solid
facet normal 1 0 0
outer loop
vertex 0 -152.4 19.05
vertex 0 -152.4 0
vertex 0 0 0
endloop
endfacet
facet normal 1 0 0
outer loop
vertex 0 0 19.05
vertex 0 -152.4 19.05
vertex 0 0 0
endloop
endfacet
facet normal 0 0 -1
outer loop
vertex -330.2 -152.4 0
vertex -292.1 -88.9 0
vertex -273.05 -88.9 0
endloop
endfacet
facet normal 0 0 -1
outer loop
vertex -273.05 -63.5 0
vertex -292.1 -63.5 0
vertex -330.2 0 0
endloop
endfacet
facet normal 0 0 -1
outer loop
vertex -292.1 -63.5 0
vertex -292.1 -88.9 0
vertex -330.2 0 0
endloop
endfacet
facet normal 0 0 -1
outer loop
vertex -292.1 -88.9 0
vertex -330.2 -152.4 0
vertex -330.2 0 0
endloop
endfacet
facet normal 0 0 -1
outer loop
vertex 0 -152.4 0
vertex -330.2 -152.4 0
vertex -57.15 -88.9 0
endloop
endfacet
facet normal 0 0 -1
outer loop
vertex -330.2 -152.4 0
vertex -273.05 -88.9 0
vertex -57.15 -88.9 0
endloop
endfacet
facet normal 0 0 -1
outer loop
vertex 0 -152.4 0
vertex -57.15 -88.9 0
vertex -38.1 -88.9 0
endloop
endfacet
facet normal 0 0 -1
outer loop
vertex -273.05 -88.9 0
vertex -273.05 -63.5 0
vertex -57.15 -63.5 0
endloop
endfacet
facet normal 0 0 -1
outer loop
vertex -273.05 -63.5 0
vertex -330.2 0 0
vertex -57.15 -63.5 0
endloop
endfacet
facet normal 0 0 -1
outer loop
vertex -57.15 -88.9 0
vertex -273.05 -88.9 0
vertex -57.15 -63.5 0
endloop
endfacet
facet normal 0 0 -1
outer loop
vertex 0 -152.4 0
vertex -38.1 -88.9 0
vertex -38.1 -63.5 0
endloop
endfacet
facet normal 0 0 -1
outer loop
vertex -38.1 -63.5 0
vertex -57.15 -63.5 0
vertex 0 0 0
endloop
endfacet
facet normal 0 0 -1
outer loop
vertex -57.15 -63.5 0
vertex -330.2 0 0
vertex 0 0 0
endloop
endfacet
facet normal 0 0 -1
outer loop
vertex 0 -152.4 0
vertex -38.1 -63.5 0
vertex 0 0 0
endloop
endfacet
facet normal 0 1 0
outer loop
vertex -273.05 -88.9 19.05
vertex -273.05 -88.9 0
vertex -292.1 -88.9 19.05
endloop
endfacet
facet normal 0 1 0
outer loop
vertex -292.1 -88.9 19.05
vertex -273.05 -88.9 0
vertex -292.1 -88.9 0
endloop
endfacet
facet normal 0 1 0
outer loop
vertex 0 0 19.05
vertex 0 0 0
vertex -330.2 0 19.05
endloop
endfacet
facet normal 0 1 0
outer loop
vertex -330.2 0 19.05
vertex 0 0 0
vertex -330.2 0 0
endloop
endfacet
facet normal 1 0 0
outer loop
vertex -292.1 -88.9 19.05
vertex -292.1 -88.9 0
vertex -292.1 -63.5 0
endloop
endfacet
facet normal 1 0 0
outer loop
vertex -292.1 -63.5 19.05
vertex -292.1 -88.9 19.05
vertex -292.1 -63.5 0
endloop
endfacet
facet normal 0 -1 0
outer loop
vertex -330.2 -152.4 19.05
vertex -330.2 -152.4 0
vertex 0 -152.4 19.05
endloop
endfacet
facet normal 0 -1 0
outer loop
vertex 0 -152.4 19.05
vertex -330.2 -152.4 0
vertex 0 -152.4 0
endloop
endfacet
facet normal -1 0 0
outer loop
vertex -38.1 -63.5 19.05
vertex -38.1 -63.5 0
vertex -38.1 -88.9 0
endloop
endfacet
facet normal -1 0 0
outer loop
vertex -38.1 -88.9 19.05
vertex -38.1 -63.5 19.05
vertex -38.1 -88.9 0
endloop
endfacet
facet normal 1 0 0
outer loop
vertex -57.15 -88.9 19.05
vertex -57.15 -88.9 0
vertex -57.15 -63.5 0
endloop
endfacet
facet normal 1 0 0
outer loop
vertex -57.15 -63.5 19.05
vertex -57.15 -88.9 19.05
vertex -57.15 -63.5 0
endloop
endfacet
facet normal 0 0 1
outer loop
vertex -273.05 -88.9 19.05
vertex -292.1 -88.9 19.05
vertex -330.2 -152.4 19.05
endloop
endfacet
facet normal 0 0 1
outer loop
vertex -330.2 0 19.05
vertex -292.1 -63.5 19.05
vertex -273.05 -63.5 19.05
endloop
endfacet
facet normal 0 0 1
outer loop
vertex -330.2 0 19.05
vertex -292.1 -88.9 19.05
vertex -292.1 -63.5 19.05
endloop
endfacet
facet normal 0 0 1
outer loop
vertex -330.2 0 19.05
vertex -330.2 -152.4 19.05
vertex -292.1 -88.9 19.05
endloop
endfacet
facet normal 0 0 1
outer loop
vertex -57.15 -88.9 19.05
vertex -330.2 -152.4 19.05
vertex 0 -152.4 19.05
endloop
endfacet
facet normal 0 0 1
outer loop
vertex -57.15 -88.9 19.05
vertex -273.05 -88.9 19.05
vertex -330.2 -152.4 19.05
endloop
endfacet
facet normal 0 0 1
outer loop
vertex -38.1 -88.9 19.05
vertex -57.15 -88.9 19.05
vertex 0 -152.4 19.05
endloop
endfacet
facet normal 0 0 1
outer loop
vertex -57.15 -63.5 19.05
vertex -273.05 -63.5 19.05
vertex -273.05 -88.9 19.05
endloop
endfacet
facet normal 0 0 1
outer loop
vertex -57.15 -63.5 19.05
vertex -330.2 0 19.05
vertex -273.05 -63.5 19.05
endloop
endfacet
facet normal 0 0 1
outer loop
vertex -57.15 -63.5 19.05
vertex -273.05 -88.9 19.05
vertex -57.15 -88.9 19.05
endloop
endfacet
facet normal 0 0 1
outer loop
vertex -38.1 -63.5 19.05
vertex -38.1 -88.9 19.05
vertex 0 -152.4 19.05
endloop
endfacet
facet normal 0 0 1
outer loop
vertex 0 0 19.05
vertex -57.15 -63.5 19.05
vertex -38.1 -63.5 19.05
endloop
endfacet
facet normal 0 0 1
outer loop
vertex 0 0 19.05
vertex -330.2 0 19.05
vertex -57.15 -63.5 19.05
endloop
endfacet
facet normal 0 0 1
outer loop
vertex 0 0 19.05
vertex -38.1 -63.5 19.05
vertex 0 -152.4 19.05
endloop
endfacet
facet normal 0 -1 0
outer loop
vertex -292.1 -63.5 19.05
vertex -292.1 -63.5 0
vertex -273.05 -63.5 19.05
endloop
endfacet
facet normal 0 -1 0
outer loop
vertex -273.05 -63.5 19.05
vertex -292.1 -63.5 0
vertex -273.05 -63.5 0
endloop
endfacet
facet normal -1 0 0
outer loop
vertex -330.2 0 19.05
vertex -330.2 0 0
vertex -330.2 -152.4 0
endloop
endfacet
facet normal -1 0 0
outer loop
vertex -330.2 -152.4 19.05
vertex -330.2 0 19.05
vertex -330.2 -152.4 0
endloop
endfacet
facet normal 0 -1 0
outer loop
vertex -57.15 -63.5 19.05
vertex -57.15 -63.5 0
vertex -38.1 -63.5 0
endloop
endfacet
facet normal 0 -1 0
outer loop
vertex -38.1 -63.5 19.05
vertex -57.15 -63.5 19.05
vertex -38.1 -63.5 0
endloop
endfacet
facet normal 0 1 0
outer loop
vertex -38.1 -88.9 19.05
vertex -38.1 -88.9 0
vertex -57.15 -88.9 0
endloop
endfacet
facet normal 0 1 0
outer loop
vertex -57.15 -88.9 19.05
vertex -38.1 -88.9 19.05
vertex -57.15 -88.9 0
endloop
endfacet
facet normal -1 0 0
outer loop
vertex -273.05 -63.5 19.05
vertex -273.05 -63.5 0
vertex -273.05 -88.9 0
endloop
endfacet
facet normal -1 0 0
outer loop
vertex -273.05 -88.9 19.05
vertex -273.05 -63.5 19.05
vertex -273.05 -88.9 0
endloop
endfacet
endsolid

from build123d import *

# Parameters (mm, degrees)
F1_DEPTH = 19.05


with BuildPart() as f1:
    # F0 (on Top) → F1 (new body)
    with BuildSketch(Plane.XY):
        Polygon((0, -152.4), (0, 0), (-38.1, 0), (-38.1, -63.5), (-38.1, -88.9), (-38.1, -152.4), align=None)
        Polygon((-38.1, -63.5), (-38.1, 0), (-292.1, 0), (-292.1, -63.5), (-273.05, -63.5), (-273.05, -88.9), (-292.1, -88.9), (-292.1, -152.4), (-38.1, -152.4), (-38.1, -88.9), (-57.15, -88.9), (-57.15, -63.5), align=None)
        Polygon((-292.1, -63.5), (-292.1, 0), (-330.2, 0), (-330.2, -152.4), (-292.1, -152.4), (-292.1, -88.9), align=None)
    extrude(amount=F1_DEPTH)


solid = f1.part
